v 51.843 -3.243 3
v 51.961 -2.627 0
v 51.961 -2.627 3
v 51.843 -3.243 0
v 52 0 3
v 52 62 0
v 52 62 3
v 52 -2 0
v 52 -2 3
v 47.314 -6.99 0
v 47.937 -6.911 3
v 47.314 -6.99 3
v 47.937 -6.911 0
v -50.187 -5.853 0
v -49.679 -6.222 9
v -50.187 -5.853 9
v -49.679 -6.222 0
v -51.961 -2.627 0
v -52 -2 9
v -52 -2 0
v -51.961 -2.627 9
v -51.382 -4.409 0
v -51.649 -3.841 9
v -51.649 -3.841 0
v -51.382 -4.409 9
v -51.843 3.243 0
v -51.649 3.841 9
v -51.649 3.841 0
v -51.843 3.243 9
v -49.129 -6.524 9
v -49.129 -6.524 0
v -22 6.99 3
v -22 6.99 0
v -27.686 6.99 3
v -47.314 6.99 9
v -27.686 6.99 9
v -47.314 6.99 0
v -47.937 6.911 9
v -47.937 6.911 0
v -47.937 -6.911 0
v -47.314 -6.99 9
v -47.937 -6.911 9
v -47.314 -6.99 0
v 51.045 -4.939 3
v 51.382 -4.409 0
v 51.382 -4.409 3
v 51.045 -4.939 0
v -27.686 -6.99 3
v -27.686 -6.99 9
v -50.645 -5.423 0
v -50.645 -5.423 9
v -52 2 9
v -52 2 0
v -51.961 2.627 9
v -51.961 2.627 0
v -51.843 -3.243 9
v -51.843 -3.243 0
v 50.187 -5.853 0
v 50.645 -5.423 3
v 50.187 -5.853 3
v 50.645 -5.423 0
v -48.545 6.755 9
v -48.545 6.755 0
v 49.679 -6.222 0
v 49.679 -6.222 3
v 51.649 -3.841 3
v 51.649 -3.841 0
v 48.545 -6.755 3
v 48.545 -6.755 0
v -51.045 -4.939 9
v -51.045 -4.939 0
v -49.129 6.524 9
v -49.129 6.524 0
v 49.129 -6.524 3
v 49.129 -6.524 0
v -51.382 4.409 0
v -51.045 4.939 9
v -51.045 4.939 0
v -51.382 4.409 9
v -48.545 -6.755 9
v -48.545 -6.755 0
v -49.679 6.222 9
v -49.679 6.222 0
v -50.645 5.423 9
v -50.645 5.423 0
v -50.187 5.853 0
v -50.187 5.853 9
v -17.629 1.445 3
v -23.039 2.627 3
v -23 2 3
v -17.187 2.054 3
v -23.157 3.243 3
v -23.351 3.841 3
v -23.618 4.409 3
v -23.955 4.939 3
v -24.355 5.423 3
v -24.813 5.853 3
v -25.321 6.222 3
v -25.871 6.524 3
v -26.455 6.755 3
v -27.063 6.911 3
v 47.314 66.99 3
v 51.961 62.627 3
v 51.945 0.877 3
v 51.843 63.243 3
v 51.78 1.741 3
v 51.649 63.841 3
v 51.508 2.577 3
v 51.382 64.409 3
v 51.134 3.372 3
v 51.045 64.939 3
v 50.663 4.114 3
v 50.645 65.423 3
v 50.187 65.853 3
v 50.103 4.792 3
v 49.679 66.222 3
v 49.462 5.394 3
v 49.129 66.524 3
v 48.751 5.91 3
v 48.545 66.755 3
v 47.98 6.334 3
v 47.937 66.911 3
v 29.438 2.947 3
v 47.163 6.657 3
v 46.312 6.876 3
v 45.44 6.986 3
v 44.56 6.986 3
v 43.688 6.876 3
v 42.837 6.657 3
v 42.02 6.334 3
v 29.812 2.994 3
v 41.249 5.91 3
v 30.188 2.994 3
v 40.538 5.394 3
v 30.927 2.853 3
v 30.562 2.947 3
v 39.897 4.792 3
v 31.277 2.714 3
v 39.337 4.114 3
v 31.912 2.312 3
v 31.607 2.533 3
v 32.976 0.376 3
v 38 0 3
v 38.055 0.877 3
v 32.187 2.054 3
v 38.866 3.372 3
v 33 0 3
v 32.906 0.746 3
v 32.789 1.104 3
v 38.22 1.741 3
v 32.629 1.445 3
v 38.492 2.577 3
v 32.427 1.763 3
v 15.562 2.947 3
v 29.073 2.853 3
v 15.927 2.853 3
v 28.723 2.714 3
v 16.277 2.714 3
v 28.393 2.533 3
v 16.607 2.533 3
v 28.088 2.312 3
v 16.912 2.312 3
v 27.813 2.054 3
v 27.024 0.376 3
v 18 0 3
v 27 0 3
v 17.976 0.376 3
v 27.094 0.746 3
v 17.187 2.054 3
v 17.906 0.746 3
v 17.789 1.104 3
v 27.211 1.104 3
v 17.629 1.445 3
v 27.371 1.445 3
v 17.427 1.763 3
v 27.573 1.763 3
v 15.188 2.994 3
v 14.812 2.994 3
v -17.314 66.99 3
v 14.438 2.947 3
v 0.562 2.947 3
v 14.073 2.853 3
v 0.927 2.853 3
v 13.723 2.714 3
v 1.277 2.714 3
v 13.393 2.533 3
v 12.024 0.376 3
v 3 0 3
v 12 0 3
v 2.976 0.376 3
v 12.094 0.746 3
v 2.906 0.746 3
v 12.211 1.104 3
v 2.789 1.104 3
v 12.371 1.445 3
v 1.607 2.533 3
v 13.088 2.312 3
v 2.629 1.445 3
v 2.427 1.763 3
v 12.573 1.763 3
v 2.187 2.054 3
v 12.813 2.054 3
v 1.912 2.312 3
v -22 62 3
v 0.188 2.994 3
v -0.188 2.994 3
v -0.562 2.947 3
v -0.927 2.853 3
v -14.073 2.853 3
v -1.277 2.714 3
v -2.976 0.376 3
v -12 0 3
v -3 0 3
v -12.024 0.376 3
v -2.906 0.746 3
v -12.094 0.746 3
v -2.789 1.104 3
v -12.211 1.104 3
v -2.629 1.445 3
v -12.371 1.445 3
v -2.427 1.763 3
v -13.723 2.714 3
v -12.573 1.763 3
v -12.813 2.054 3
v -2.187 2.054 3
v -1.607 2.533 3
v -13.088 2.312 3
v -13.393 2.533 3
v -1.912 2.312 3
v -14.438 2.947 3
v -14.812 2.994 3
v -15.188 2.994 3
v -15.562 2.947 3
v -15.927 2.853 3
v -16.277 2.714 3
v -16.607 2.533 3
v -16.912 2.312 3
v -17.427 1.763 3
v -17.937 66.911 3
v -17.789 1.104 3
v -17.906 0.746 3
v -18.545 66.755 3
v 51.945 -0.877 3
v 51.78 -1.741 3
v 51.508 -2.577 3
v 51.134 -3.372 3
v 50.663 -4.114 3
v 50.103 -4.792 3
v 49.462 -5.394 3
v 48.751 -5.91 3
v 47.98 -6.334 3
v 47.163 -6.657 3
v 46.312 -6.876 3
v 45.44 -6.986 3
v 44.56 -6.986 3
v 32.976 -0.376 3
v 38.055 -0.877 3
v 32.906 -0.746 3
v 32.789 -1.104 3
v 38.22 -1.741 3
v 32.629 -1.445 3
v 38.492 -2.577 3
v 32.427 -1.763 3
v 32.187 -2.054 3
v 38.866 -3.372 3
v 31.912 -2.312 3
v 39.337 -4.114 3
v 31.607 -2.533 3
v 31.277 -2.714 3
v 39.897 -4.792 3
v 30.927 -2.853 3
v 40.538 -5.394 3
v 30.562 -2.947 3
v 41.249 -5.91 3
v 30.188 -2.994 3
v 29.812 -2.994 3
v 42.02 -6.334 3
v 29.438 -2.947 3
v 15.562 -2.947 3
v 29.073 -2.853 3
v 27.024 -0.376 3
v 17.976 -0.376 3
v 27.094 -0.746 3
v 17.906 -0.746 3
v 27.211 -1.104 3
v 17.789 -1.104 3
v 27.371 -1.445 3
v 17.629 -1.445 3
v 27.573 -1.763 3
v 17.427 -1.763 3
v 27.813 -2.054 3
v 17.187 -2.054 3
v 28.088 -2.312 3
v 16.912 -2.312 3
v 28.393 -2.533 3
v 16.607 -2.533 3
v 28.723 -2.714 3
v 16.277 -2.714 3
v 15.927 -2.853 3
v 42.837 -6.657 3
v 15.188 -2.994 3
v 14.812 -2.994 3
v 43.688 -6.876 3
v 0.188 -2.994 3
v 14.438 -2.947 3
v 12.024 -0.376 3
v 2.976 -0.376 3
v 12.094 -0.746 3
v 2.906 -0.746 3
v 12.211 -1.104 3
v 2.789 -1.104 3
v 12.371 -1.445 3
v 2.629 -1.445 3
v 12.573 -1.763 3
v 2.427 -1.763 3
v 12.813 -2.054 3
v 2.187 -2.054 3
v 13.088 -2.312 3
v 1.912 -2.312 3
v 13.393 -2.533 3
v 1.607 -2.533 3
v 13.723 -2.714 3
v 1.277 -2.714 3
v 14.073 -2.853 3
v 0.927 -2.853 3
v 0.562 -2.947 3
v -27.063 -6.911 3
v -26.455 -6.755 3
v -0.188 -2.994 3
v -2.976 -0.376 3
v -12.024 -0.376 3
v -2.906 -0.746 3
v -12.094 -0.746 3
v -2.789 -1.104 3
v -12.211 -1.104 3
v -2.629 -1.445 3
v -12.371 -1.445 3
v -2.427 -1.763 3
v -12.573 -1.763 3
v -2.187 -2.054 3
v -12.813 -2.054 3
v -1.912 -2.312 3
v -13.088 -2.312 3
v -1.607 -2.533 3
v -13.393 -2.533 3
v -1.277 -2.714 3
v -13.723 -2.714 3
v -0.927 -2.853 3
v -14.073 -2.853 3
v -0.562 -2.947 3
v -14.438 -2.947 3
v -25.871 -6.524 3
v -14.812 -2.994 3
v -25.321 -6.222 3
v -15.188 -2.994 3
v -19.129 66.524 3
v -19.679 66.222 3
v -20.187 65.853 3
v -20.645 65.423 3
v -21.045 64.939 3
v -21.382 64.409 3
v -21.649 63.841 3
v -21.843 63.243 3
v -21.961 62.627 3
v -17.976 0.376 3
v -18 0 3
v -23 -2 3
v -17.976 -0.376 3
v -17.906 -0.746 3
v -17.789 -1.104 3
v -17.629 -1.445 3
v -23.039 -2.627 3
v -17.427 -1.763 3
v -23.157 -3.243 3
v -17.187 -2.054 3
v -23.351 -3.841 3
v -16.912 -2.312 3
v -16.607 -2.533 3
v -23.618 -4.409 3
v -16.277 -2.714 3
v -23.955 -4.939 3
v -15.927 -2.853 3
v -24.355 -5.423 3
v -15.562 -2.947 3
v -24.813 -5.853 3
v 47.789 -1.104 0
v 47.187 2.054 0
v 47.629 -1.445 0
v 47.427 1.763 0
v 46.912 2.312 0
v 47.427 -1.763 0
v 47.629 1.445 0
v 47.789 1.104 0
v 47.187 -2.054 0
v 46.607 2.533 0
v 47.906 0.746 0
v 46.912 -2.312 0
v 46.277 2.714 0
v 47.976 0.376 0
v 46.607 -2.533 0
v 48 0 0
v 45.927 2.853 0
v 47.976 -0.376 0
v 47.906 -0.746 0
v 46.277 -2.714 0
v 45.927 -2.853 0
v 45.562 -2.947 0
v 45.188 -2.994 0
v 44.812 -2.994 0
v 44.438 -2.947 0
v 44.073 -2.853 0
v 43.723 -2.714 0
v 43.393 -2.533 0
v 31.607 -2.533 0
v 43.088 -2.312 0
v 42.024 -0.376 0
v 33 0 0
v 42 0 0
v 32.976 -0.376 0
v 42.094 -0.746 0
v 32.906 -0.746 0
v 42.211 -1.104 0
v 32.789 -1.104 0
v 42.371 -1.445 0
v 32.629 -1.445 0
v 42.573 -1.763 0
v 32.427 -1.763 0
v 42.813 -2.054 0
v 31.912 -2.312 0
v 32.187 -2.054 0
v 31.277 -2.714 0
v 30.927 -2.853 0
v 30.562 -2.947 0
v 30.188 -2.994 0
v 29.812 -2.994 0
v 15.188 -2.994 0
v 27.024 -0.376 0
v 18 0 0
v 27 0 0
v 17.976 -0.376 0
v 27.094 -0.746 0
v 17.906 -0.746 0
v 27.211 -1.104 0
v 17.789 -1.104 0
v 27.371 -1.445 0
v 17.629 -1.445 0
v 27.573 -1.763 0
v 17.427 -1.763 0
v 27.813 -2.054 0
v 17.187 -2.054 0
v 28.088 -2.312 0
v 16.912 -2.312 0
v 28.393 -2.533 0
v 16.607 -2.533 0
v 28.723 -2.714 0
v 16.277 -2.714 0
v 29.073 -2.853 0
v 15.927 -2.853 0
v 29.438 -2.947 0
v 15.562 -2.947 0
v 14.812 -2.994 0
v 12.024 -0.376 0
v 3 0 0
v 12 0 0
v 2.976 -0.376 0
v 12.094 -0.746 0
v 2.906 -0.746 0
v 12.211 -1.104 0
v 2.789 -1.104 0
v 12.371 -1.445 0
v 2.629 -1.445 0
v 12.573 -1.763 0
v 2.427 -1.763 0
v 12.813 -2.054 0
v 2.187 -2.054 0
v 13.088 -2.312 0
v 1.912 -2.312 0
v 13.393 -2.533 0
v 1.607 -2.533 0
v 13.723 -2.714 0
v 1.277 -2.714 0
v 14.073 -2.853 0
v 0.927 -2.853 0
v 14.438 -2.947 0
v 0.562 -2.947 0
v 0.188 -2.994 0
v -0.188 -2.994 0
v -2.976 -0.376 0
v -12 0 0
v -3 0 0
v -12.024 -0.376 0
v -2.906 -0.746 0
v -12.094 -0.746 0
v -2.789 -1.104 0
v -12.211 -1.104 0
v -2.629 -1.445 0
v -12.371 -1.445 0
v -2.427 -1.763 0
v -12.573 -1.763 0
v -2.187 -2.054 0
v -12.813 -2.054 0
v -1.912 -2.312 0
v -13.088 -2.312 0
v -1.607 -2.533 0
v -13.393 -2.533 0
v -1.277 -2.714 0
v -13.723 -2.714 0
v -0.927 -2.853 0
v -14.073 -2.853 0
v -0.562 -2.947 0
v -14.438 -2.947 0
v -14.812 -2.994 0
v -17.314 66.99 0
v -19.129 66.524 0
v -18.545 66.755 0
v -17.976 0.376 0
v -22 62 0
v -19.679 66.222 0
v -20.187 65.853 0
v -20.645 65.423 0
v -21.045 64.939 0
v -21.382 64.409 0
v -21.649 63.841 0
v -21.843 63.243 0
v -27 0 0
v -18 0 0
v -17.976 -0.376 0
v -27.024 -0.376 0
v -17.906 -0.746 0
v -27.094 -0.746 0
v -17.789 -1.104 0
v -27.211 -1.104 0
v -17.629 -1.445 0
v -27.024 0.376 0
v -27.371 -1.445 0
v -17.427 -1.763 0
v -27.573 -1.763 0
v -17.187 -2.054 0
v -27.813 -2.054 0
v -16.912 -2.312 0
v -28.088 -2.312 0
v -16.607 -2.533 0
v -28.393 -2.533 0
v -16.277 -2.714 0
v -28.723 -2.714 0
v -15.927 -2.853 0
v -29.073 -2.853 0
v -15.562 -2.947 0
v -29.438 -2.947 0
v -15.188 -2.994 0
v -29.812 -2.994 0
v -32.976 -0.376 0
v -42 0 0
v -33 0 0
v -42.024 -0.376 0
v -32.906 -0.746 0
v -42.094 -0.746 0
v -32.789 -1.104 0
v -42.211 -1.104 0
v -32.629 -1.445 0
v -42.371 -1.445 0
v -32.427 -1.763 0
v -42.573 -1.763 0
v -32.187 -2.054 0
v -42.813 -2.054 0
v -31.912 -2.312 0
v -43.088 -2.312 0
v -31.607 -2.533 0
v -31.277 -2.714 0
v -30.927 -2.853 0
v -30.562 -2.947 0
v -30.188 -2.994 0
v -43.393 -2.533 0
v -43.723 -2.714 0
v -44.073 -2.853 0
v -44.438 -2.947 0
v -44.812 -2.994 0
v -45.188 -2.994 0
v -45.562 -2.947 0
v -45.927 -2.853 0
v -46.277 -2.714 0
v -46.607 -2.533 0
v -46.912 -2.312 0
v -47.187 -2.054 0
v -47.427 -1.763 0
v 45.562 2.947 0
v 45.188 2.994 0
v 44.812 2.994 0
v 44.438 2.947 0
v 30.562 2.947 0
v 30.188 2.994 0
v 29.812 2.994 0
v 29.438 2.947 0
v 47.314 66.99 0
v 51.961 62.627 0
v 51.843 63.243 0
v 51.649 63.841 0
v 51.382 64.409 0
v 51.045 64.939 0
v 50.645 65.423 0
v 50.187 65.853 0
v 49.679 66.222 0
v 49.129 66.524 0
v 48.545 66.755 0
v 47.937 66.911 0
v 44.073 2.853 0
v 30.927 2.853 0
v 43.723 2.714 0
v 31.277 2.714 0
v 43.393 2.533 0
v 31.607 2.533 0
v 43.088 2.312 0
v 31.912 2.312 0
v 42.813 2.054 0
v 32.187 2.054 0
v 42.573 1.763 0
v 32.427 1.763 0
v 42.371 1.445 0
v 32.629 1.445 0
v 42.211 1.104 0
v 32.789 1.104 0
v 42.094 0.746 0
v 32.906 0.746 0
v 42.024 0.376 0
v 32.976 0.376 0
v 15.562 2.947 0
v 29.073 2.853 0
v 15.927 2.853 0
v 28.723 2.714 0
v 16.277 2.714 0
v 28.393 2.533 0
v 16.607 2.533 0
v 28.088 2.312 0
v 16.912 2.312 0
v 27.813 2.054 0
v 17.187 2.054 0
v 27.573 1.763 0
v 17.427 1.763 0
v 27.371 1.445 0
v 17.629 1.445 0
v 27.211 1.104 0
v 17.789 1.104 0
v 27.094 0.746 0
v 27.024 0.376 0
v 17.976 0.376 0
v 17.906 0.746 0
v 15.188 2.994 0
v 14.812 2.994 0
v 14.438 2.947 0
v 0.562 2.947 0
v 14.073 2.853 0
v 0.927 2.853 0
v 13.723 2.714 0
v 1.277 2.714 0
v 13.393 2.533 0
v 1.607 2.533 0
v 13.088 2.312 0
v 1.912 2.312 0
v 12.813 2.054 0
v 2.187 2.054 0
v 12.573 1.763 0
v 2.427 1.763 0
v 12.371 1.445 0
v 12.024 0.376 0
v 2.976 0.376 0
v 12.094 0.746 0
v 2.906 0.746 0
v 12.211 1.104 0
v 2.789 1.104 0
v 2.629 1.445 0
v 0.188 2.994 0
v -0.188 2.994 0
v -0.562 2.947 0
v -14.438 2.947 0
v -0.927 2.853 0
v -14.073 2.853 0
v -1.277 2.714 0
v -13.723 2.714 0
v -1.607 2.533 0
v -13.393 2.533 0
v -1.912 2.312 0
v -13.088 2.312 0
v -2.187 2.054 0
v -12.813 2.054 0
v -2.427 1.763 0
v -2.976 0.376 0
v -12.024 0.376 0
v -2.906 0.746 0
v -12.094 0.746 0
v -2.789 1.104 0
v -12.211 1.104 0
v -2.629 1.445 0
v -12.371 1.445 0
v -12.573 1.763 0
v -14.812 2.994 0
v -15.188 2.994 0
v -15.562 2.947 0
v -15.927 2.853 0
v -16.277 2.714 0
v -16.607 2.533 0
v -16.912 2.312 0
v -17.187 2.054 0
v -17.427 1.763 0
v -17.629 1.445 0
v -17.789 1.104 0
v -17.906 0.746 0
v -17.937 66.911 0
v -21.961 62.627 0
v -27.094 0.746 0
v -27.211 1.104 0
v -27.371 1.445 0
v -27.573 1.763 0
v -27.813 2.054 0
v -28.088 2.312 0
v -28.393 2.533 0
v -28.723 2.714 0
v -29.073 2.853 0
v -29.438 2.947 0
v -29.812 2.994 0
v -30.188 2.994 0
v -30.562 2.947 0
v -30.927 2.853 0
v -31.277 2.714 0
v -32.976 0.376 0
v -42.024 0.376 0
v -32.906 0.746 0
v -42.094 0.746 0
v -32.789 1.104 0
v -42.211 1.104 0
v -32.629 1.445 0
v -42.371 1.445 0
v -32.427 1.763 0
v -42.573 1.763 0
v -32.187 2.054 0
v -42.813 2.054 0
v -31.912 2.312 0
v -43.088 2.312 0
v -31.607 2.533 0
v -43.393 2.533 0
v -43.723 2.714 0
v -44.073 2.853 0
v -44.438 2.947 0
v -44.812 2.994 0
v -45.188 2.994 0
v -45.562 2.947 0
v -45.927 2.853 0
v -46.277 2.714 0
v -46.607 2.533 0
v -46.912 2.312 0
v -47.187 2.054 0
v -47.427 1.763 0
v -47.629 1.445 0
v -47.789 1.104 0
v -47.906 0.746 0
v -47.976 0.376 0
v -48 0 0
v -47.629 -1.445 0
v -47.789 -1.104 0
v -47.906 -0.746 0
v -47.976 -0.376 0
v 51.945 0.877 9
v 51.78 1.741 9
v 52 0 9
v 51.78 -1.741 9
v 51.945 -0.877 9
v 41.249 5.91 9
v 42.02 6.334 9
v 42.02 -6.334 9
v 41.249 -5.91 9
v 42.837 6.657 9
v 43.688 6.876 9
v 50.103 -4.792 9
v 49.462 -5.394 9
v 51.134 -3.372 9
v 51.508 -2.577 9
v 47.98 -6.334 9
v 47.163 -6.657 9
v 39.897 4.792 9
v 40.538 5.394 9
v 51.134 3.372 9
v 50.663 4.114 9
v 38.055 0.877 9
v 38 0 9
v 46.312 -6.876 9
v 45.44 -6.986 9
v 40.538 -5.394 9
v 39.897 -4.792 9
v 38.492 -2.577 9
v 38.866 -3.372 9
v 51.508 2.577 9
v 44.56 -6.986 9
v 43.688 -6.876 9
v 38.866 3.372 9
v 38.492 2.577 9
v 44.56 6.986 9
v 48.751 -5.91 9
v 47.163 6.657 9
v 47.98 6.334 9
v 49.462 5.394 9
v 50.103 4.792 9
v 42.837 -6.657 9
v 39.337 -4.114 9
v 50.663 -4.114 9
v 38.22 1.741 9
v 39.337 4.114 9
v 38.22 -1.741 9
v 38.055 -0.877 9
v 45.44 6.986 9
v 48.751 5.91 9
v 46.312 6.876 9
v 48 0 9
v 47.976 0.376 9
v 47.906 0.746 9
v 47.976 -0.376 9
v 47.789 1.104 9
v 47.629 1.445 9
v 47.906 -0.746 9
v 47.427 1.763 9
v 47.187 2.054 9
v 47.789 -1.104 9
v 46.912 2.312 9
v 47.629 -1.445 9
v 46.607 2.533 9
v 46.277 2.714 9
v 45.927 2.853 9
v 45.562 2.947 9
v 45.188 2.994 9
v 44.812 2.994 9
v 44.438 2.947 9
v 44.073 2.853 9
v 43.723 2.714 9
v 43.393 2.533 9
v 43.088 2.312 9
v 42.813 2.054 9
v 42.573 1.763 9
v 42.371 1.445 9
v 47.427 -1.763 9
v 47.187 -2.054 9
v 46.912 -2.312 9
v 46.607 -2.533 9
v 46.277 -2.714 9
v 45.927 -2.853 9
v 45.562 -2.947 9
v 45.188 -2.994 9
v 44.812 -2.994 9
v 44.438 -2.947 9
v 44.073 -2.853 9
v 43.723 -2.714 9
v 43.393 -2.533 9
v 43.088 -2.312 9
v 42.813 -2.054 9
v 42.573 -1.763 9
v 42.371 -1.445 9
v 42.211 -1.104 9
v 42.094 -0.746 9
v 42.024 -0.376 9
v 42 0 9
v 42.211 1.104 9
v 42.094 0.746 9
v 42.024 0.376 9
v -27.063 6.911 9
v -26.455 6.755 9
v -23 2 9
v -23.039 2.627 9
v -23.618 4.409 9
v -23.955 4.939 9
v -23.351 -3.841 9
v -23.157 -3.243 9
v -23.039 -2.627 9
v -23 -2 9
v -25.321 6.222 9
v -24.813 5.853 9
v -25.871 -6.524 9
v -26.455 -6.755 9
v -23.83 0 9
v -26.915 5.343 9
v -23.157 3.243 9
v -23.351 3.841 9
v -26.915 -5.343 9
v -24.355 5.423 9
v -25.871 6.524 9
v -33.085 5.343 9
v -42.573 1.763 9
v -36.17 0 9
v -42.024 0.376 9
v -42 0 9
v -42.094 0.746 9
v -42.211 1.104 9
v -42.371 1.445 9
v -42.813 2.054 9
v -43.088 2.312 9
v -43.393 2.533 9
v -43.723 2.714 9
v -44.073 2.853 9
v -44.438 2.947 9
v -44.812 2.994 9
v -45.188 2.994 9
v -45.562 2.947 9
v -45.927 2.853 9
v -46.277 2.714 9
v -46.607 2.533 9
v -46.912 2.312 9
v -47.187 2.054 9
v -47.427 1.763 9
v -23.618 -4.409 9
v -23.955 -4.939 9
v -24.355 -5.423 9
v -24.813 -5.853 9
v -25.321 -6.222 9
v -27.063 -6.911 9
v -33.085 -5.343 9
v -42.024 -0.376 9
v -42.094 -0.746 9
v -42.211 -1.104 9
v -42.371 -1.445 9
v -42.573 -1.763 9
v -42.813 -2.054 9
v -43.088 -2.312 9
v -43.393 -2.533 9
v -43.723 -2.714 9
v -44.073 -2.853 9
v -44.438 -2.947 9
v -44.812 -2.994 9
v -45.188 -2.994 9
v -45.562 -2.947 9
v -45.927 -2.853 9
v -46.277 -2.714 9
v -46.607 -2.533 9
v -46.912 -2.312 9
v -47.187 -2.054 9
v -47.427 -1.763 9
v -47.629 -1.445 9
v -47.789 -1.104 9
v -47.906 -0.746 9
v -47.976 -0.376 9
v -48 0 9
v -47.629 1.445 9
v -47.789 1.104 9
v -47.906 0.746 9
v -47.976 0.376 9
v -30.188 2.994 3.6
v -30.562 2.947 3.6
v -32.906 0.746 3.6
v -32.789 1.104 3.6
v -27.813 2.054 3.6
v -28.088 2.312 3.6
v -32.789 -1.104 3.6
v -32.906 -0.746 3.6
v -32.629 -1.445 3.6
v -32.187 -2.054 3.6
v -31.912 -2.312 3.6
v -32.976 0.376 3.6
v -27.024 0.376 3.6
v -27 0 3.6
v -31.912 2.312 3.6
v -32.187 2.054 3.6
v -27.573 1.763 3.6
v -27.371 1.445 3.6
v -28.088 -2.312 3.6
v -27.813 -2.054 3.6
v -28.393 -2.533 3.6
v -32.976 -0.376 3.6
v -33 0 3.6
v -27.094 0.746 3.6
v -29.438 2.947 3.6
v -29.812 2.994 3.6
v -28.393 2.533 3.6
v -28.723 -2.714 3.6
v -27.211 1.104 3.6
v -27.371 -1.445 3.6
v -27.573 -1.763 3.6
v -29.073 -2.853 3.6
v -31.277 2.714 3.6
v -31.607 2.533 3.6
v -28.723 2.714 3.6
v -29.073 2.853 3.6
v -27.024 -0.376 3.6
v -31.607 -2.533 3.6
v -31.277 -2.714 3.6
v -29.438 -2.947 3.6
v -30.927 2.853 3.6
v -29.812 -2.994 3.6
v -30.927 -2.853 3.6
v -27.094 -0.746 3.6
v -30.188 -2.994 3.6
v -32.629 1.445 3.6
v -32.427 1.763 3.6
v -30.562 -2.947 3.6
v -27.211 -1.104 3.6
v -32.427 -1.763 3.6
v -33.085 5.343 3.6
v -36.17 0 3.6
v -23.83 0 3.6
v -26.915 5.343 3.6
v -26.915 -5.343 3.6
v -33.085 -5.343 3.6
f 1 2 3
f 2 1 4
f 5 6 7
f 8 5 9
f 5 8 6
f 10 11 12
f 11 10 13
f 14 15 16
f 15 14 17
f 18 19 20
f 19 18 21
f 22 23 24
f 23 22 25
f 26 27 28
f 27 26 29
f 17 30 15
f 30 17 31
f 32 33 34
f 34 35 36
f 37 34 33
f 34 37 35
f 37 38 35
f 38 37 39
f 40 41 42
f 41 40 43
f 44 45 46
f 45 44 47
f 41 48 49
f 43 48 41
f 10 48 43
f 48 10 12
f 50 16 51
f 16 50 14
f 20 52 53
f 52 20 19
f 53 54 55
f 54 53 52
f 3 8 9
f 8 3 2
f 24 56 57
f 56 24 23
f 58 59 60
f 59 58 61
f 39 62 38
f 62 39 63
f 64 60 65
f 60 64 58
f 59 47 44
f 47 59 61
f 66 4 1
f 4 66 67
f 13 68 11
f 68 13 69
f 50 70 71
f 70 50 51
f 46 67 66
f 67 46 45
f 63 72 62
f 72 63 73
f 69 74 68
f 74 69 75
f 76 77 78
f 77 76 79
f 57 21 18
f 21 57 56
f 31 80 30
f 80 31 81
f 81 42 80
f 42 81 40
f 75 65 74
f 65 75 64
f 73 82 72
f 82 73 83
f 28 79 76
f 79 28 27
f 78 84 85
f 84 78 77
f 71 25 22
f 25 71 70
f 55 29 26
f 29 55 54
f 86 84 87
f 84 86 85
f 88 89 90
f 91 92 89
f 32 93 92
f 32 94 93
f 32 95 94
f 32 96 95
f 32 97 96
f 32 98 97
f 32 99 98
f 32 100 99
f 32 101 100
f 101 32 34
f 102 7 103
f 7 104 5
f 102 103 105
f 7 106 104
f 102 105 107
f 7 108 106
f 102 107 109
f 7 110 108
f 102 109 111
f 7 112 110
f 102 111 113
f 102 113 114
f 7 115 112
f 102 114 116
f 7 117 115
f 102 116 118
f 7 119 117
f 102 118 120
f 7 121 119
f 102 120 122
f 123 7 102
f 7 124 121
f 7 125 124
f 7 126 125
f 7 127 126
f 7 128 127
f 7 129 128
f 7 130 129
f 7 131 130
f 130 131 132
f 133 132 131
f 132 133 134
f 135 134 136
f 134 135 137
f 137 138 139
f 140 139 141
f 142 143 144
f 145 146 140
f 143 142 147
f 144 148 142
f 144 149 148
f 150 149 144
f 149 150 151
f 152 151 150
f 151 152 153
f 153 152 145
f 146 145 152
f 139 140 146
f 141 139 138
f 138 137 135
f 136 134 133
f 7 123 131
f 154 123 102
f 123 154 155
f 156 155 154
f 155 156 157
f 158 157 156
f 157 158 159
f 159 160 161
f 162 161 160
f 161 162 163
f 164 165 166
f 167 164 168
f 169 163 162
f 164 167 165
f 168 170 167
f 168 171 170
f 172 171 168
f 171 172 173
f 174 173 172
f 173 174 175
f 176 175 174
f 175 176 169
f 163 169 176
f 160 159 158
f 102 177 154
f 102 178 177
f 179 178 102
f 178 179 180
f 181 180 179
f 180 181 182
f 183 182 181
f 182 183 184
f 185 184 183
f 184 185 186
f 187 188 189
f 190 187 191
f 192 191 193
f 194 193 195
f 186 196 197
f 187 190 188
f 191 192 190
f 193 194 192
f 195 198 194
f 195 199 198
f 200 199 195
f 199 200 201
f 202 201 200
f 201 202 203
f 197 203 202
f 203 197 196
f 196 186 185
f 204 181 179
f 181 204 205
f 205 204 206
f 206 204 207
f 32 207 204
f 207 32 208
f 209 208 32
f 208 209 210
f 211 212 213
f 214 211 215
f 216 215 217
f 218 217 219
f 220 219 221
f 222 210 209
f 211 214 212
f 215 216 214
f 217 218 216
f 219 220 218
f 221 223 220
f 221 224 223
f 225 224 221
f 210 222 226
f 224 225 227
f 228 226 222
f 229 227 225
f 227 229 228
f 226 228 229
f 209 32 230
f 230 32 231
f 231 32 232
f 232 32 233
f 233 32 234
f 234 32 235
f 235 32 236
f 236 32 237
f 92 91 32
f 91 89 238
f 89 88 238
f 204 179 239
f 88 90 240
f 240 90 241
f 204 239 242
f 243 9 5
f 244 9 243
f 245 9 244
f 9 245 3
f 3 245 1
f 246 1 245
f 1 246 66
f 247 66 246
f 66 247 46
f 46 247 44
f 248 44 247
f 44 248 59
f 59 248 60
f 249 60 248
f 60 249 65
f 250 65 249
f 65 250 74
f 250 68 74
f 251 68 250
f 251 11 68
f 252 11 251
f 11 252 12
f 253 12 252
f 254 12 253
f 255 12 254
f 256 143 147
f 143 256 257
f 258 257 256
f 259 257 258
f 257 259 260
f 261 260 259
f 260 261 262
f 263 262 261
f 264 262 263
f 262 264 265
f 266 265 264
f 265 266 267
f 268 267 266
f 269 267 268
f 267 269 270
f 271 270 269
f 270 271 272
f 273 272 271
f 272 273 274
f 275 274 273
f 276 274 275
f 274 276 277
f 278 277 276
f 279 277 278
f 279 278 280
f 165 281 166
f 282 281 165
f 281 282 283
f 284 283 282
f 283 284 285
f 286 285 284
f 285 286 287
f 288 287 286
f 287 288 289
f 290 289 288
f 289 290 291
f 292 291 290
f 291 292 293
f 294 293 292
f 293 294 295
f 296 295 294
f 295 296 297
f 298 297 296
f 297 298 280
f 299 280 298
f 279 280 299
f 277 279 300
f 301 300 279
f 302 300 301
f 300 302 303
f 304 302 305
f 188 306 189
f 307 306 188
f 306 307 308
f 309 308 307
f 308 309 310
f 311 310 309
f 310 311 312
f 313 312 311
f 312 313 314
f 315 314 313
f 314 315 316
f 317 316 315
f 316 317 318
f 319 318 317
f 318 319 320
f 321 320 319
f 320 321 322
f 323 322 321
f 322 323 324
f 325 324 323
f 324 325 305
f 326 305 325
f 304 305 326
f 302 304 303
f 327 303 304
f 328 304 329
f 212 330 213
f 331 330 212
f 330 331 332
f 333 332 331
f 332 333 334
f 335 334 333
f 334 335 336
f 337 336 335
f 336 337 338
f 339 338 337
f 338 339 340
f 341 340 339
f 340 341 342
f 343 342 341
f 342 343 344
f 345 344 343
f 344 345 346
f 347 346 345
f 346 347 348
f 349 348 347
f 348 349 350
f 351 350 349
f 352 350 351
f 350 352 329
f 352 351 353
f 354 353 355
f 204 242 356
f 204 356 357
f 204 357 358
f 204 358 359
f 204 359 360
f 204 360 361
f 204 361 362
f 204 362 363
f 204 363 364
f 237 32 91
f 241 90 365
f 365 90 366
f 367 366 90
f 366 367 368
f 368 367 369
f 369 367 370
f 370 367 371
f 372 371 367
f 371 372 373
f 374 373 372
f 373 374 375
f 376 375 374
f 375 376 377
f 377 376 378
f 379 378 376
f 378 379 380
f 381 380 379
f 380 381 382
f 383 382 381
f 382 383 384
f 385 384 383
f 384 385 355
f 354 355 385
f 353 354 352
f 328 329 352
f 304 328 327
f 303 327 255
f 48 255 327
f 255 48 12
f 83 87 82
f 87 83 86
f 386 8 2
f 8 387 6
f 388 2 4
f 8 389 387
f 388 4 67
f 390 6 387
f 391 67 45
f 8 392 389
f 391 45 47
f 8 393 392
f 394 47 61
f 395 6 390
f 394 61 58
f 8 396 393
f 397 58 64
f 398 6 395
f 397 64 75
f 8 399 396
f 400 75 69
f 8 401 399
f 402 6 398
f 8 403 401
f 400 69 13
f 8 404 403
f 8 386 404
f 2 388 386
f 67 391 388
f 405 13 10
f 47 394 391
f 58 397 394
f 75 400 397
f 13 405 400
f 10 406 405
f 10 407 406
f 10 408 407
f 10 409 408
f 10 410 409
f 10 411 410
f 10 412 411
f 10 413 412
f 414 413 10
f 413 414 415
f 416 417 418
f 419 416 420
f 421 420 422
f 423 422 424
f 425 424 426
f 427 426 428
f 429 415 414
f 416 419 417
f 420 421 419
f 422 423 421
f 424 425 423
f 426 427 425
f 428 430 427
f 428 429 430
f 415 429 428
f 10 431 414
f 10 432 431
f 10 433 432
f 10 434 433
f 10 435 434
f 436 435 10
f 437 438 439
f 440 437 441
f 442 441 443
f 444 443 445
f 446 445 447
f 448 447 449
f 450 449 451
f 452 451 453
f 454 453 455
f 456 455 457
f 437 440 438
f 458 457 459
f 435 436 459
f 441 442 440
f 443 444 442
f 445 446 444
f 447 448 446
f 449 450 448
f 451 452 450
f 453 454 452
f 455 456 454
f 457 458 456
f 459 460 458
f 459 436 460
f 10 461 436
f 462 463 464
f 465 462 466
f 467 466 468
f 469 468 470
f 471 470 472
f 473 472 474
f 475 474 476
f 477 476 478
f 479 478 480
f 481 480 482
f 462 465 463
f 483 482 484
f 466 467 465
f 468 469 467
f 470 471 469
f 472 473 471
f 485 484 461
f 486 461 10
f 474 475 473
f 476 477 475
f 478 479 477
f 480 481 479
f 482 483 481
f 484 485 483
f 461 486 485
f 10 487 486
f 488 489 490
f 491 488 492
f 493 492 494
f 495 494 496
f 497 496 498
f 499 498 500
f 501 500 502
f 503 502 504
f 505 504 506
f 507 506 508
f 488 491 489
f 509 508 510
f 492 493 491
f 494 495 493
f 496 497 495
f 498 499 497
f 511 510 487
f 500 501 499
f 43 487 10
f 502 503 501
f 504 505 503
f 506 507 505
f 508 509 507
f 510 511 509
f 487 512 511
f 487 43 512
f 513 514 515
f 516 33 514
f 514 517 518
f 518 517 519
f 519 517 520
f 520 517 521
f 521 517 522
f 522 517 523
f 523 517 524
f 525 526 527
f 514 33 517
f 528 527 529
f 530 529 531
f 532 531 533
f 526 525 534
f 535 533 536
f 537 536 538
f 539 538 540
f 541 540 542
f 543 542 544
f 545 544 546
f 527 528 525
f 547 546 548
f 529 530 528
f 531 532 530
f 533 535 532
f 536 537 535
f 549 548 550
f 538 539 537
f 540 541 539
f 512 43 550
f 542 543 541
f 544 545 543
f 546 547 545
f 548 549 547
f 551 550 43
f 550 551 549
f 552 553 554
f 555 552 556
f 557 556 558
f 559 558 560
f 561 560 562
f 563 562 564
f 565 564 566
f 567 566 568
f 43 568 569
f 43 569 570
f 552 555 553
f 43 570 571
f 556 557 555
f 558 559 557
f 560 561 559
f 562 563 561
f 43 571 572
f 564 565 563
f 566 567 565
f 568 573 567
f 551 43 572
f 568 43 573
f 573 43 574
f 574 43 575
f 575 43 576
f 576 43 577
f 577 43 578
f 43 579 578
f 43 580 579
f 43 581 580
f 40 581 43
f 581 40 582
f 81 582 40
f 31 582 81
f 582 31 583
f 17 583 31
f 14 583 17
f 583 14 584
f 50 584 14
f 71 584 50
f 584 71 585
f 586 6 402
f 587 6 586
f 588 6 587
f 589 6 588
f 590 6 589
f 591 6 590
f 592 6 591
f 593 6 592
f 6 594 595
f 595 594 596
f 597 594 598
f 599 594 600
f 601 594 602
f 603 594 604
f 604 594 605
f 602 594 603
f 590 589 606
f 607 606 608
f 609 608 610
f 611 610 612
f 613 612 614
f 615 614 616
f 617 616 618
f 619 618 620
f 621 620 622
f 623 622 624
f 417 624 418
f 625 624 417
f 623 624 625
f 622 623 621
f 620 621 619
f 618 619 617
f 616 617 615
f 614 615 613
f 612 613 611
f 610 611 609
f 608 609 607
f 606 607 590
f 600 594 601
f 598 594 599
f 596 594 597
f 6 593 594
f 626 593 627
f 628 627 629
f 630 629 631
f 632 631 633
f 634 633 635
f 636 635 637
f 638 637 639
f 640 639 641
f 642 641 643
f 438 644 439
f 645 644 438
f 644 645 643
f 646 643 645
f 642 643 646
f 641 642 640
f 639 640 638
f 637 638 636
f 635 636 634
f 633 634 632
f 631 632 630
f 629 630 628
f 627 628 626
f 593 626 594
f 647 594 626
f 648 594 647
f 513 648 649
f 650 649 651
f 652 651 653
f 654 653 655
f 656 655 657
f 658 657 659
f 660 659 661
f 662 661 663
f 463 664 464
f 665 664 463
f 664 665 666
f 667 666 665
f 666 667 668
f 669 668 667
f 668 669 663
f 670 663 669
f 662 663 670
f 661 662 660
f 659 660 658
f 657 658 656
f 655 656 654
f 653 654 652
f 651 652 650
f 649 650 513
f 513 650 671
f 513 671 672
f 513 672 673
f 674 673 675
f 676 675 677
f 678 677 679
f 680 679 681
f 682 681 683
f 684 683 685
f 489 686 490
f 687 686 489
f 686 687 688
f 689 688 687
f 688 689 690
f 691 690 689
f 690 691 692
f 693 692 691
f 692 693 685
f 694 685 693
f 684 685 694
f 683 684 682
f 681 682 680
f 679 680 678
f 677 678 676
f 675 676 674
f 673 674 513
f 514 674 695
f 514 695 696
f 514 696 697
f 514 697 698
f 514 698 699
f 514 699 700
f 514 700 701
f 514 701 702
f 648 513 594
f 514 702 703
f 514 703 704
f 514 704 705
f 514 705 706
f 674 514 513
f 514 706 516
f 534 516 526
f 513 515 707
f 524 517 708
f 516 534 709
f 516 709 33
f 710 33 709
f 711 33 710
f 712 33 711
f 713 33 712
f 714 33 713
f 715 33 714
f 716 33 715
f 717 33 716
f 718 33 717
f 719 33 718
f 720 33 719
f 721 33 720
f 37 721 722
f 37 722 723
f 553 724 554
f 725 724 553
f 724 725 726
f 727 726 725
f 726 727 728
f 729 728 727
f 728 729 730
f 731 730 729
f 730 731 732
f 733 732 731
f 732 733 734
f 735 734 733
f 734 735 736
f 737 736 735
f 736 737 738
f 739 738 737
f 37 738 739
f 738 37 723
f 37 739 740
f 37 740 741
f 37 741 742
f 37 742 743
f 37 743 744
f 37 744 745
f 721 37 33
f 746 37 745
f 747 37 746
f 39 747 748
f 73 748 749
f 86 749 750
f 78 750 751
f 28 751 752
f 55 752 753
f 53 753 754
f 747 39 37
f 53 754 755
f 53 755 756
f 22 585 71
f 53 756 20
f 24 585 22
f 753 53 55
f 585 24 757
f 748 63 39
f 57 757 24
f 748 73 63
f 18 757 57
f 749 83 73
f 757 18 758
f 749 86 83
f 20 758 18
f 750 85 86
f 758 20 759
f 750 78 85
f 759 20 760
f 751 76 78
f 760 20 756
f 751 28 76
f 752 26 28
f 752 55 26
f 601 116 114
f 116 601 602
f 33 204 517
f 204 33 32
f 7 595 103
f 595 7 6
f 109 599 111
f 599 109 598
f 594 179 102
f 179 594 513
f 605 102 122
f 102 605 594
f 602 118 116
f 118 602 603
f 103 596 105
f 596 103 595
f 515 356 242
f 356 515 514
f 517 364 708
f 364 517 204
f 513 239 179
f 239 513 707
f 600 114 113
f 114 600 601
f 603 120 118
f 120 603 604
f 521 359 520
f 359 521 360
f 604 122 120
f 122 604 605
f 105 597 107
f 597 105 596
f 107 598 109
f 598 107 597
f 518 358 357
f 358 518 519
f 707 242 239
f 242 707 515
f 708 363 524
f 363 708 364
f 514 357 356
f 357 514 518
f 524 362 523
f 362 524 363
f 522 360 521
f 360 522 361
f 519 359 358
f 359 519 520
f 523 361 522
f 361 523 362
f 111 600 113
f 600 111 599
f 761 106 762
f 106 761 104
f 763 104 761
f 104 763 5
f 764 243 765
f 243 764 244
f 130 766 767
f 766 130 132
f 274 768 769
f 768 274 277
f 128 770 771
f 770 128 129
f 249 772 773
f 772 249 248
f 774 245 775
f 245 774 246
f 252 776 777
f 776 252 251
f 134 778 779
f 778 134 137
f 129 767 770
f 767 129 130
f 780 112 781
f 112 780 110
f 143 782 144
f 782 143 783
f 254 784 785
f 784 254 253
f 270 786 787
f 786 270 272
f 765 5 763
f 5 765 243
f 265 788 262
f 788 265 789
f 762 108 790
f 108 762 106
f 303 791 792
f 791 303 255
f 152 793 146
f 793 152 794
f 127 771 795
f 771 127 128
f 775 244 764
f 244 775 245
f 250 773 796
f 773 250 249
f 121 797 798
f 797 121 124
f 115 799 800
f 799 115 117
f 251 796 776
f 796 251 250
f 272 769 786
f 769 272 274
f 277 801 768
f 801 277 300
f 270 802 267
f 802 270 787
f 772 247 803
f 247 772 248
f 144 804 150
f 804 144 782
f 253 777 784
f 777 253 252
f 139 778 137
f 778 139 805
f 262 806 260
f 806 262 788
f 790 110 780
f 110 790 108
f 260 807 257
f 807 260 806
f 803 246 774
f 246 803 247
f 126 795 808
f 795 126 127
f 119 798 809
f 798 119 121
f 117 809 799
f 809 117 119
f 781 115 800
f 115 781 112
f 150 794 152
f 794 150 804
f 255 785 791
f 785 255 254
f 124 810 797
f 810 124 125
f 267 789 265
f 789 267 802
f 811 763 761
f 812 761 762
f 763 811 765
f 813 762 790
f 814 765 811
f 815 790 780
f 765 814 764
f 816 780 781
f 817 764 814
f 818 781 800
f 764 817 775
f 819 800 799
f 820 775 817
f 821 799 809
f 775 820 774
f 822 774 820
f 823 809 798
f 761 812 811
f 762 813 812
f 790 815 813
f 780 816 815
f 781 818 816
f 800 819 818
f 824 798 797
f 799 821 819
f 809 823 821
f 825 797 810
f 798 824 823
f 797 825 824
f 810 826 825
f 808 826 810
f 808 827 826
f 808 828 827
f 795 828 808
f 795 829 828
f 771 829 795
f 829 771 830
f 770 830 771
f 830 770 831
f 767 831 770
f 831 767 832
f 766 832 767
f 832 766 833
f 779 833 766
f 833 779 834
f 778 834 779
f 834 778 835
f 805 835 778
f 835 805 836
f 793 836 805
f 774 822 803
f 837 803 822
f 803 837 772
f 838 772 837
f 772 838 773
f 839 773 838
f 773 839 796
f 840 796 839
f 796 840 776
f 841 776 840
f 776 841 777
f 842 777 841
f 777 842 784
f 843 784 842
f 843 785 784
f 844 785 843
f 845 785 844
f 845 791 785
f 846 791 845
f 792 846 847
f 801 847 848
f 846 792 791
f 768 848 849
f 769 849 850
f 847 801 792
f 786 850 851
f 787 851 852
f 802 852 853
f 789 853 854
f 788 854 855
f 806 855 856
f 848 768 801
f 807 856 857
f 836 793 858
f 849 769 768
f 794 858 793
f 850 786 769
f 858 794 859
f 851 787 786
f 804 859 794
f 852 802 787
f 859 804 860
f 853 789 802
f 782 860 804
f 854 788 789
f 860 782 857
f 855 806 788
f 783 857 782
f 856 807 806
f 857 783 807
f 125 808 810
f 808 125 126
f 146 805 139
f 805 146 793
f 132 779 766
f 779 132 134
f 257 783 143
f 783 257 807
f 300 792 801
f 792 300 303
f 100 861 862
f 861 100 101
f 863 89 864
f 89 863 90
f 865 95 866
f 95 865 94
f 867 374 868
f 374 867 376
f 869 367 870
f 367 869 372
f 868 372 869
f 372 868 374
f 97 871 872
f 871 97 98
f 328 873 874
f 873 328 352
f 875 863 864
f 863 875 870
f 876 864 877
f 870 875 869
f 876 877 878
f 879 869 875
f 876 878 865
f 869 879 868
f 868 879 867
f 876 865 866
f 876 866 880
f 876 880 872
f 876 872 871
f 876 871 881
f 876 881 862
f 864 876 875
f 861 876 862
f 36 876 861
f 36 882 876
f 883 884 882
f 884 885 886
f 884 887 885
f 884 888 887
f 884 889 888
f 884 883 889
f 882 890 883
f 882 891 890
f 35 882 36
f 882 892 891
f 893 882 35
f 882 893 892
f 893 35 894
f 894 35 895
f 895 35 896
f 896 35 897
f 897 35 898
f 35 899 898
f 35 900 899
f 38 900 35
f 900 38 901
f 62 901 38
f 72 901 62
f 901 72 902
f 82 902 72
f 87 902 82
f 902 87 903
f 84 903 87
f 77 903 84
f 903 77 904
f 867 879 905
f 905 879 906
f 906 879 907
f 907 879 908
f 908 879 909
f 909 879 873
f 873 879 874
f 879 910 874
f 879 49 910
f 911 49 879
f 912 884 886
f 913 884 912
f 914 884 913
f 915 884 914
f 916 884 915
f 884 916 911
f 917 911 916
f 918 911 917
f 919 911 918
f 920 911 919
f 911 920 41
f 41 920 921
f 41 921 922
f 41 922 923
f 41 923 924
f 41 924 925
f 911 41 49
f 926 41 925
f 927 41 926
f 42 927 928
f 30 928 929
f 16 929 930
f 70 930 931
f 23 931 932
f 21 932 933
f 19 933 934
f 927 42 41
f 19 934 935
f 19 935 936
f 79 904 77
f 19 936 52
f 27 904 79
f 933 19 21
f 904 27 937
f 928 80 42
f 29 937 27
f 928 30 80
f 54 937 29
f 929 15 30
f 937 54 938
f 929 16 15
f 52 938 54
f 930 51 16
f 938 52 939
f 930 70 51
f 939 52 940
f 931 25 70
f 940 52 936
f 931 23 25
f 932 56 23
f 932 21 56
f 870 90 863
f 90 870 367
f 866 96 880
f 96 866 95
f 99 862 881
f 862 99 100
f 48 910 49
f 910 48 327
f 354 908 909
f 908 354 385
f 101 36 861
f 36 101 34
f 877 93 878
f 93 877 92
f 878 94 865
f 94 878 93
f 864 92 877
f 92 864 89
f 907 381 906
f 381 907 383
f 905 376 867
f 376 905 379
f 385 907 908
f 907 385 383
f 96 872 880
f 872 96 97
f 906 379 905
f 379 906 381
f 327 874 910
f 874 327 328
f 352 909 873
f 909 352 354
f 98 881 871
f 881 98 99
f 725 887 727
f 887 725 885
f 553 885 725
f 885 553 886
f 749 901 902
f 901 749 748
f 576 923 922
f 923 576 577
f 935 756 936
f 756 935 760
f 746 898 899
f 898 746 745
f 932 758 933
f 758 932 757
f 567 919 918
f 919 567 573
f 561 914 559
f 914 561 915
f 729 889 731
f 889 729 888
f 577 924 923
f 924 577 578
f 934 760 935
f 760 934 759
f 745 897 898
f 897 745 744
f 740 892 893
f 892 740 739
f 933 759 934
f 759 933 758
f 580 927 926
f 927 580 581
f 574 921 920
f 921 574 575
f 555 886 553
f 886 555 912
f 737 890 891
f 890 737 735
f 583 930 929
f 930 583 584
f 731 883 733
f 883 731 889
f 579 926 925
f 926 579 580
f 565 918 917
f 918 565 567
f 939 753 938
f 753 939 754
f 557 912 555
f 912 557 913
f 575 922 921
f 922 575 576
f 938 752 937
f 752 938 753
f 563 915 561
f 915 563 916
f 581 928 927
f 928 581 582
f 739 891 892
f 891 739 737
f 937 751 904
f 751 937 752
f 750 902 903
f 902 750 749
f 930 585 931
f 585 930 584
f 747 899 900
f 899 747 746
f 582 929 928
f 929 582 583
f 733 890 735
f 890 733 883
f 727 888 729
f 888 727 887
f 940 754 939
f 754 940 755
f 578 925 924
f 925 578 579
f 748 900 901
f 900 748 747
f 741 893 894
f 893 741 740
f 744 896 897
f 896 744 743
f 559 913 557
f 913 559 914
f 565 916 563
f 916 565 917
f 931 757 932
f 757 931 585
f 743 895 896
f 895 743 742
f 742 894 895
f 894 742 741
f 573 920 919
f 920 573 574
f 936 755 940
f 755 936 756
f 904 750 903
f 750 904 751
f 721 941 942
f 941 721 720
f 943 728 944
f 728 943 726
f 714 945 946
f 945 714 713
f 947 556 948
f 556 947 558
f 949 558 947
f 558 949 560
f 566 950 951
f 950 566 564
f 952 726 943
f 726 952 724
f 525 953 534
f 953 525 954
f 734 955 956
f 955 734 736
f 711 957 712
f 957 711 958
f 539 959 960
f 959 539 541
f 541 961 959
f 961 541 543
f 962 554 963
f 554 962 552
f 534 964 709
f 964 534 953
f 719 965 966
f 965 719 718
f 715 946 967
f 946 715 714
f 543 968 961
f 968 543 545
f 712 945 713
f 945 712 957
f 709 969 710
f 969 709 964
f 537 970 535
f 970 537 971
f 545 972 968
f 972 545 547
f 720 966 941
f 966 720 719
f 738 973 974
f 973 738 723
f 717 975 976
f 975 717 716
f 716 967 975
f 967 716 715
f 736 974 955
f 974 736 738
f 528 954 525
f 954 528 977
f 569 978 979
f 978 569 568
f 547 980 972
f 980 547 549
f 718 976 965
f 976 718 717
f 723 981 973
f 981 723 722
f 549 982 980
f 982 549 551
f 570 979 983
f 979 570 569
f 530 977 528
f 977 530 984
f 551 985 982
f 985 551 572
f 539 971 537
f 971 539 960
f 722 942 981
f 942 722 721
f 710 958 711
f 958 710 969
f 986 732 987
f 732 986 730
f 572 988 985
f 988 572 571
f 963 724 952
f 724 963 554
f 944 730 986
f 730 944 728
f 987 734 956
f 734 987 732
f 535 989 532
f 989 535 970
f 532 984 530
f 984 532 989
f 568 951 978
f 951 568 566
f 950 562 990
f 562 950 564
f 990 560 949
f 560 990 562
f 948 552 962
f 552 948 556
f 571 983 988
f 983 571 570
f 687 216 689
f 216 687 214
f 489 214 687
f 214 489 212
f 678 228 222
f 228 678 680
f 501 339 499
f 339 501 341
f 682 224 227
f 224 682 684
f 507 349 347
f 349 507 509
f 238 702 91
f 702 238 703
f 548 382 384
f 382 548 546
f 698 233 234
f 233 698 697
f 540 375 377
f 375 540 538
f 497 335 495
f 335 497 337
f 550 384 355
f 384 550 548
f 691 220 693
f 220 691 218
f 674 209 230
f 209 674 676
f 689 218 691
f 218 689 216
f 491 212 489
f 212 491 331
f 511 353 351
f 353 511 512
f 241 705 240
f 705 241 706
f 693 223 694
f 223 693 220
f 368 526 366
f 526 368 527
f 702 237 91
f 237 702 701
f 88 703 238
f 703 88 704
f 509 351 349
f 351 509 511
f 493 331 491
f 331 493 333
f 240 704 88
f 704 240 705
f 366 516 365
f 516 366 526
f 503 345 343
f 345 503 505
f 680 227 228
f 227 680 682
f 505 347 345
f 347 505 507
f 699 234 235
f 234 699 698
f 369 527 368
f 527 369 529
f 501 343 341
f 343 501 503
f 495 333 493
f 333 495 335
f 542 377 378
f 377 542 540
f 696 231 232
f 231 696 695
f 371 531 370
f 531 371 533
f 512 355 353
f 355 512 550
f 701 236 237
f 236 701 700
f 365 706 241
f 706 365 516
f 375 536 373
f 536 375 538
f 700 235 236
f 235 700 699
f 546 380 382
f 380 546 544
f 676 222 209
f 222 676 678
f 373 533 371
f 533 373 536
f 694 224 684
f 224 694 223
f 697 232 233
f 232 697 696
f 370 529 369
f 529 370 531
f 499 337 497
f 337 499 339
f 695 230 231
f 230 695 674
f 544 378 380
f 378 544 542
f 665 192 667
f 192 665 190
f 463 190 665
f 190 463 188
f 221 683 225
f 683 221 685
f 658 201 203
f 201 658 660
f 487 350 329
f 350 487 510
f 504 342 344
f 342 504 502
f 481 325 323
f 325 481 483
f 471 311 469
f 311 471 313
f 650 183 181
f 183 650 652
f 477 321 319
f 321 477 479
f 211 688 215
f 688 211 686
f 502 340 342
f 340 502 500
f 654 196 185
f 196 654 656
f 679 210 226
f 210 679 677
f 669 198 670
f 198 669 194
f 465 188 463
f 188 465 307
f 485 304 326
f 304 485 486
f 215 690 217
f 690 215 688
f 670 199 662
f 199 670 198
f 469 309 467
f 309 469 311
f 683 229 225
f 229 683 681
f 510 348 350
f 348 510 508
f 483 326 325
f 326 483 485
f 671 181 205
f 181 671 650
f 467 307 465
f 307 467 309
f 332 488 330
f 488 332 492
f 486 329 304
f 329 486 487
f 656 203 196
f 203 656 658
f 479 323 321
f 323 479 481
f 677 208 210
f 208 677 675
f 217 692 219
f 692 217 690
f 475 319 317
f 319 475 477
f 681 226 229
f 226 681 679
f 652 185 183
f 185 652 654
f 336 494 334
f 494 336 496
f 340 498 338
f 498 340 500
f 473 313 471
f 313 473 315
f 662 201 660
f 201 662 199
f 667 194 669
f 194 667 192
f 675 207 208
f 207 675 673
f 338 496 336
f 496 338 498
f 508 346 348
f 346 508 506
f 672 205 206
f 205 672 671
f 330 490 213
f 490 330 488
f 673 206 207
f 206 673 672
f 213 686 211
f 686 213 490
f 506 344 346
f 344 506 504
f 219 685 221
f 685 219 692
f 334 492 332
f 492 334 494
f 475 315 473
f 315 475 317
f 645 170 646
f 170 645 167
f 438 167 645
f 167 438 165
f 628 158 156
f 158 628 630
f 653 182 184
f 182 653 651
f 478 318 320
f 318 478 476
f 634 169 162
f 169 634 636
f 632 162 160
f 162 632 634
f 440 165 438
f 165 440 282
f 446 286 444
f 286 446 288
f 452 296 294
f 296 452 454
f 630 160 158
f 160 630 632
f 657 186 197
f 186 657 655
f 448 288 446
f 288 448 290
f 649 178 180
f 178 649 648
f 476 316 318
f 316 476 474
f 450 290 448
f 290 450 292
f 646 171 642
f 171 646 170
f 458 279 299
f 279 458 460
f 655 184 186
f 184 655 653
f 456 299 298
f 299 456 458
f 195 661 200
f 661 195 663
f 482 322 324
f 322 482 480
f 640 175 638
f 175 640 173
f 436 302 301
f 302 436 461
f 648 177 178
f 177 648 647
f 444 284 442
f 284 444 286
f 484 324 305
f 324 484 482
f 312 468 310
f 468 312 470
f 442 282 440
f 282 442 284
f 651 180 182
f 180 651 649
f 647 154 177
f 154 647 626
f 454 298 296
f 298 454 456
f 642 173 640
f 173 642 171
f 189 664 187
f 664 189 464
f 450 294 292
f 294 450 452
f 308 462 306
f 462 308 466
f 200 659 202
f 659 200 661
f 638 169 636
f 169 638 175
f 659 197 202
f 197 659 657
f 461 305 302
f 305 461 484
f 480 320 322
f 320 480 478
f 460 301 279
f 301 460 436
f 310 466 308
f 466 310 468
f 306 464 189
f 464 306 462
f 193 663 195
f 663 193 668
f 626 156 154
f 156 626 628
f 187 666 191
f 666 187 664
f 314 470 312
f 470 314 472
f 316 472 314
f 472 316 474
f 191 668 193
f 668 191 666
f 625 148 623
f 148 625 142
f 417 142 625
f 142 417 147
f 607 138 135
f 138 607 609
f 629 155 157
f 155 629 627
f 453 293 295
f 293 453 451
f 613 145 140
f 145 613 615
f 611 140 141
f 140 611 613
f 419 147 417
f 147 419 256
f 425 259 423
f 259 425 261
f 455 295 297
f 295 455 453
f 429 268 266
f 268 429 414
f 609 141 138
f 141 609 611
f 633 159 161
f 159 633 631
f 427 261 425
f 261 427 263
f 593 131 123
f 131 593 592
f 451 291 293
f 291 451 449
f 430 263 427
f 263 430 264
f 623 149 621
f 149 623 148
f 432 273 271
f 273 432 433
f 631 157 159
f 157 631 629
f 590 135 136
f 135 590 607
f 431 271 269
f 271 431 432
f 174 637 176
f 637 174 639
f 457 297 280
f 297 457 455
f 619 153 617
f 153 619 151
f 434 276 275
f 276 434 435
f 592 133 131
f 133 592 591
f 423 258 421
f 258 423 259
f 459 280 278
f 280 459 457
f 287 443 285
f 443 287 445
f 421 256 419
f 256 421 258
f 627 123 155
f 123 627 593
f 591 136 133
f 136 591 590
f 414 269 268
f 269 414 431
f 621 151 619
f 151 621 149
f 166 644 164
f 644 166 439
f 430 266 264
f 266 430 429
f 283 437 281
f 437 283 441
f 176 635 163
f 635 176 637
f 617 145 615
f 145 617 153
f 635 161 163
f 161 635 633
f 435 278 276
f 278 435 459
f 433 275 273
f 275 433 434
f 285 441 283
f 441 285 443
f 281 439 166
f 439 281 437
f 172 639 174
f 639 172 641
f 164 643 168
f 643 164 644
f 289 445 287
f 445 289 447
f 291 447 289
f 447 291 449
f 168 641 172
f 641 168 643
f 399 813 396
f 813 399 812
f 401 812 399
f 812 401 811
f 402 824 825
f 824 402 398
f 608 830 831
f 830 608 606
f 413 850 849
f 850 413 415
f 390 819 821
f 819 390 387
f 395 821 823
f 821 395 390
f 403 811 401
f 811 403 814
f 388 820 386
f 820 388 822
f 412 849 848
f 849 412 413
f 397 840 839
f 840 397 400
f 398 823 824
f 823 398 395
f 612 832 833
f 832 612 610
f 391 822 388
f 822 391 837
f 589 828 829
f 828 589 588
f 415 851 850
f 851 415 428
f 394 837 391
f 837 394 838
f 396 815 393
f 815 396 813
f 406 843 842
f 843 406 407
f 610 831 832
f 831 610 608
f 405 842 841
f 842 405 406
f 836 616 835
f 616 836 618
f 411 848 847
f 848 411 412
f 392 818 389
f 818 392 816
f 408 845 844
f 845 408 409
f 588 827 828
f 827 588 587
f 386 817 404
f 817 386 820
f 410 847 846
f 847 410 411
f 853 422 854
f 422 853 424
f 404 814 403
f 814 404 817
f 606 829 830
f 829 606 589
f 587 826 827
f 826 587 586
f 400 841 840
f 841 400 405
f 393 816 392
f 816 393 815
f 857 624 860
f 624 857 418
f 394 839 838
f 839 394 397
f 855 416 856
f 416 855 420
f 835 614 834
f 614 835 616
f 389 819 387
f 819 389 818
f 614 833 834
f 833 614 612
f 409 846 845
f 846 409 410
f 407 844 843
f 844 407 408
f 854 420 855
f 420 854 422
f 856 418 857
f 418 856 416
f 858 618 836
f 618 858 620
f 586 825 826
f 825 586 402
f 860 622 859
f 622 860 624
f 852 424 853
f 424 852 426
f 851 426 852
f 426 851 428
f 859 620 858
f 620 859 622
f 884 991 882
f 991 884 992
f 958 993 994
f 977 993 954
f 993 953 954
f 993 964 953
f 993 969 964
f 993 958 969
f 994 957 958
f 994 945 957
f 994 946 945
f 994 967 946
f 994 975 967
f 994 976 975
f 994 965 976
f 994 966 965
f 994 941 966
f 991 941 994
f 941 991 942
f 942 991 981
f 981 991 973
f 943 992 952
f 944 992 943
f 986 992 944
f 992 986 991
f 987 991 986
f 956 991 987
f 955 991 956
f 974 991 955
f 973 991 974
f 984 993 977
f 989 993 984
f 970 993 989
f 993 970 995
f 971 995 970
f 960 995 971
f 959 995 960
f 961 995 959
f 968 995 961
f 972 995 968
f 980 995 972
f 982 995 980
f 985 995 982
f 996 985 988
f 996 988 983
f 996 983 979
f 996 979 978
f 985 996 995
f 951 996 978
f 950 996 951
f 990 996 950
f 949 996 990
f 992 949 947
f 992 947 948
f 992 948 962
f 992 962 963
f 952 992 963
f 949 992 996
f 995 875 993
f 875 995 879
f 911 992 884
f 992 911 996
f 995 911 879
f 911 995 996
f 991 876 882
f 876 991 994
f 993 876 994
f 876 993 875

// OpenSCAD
$fn = 50;


difference() {
	union() {
		translate(v = [0, 0, 0]) {
			rotate(a = [0, 0, 0]) {
				hull() {
					translate(v = [-47.0000000000, 2.0000000000, 0]) {
						rotate(a = [0, 0, 0]) {
							translate(v = [0, 0, 0]) {
								rotate(a = [0, 0, 0]) {
									cylinder(h = 3, r = 5);
								}
							}
						}
					}
					translate(v = [47.0000000000, 2.0000000000, 0]) {
						rotate(a = [0, 0, 0]) {
							translate(v = [0, 0, 0]) {
								rotate(a = [0, 0, 0]) {
									cylinder(h = 3, r = 5);
								}
							}
						}
					}
					translate(v = [-47.0000000000, -2.0000000000, 0]) {
						rotate(a = [0, 0, 0]) {
							translate(v = [0, 0, 0]) {
								rotate(a = [0, 0, 0]) {
									cylinder(h = 3, r = 5);
								}
							}
						}
					}
					translate(v = [47.0000000000, -2.0000000000, 0]) {
						rotate(a = [0, 0, 0]) {
							translate(v = [0, 0, 0]) {
								rotate(a = [0, 0, 0]) {
									cylinder(h = 3, r = 5);
								}
							}
						}
					}
				}
			}
		}
		translate(v = [15, 30, 0]) {
			rotate(a = [0, 0, 0]) {
				hull() {
					translate(v = [-32.0000000000, 32.0000000000, 0]) {
						rotate(a = [0, 0, 0]) {
							translate(v = [0, 0, 0]) {
								rotate(a = [0, 0, 0]) {
									cylinder(h = 3, r = 5);
								}
							}
						}
					}
					translate(v = [32.0000000000, 32.0000000000, 0]) {
						rotate(a = [0, 0, 0]) {
							translate(v = [0, 0, 0]) {
								rotate(a = [0, 0, 0]) {
									cylinder(h = 3, r = 5);
								}
							}
						}
					}
					translate(v = [-32.0000000000, -32.0000000000, 0]) {
						rotate(a = [0, 0, 0]) {
							translate(v = [0, 0, 0]) {
								rotate(a = [0, 0, 0]) {
									cylinder(h = 3, r = 5);
								}
							}
						}
					}
					translate(v = [32.0000000000, -32.0000000000, 0]) {
						rotate(a = [0, 0, 0]) {
							translate(v = [0, 0, 0]) {
								rotate(a = [0, 0, 0]) {
									cylinder(h = 3, r = 5);
								}
							}
						}
					}
				}
			}
		}
		translate(v = [45.0000000000, 0, 0]) {
			rotate(a = [0, 0, 0]) {
				cylinder(h = 9, r = 7.0000000000);
			}
		}
		translate(v = [-37.5000000000, 0, 0]) {
			rotate(a = [0, 0, 0]) {
				hull() {
					translate(v = [-9.5000000000, 2.0000000000, 0]) {
						rotate(a = [0, 0, 0]) {
							translate(v = [0, 0, 0]) {
								rotate(a = [0, 0, 0]) {
									cylinder(h = 9, r = 5);
								}
							}
						}
					}
					translate(v = [9.5000000000, 2.0000000000, 0]) {
						rotate(a = [0, 0, 0]) {
							translate(v = [0, 0, 0]) {
								rotate(a = [0, 0, 0]) {
									cylinder(h = 9, r = 5);
								}
							}
						}
					}
					translate(v = [-9.5000000000, -2.0000000000, 0]) {
						rotate(a = [0, 0, 0]) {
							translate(v = [0, 0, 0]) {
								rotate(a = [0, 0, 0]) {
									cylinder(h = 9, r = 5);
								}
							}
						}
					}
					translate(v = [9.5000000000, -2.0000000000, 0]) {
						rotate(a = [0, 0, 0]) {
							translate(v = [0, 0, 0]) {
								rotate(a = [0, 0, 0]) {
									cylinder(h = 9, r = 5);
								}
							}
						}
					}
				}
			}
		}
	}
	union() {
		translate(v = [-45.0000000000, 0.0000000000, 0]) {
			rotate(a = [0, 0, 0]) {
				translate(v = [0, 0, -50]) {
					rotate(a = [0, 0, 0]) {
						cylinder(h = 100, r = 3.0000000000);
					}
				}
			}
		}
		translate(v = [-30.0000000000, 0.0000000000, 0]) {
			rotate(a = [0, 0, 0]) {
				translate(v = [0, 0, -50]) {
					rotate(a = [0, 0, 0]) {
						cylinder(h = 100, r = 3.0000000000);
					}
				}
			}
		}
		translate(v = [-15.0000000000, 0.0000000000, 0]) {
			rotate(a = [0, 0, 0]) {
				translate(v = [0, 0, -50]) {
					rotate(a = [0, 0, 0]) {
						cylinder(h = 100, r = 3.0000000000);
					}
				}
			}
		}
		translate(v = [0.0000000000, 0.0000000000, 0]) {
			rotate(a = [0, 0, 0]) {
				translate(v = [0, 0, -50]) {
					rotate(a = [0, 0, 0]) {
						cylinder(h = 100, r = 3.0000000000);
					}
				}
			}
		}
		translate(v = [15.0000000000, 0.0000000000, 0]) {
			rotate(a = [0, 0, 0]) {
				translate(v = [0, 0, -50]) {
					rotate(a = [0, 0, 0]) {
						cylinder(h = 100, r = 3.0000000000);
					}
				}
			}
		}
		translate(v = [30.0000000000, 0.0000000000, 0]) {
			rotate(a = [0, 0, 0]) {
				translate(v = [0, 0, -50]) {
					rotate(a = [0, 0, 0]) {
						cylinder(h = 100, r = 3.0000000000);
					}
				}
			}
		}
		translate(v = [45.0000000000, 0.0000000000, 0]) {
			rotate(a = [0, 0, 0]) {
				translate(v = [0, 0, -50]) {
					rotate(a = [0, 0, 0]) {
						cylinder(h = 100, r = 3.0000000000);
					}
				}
			}
		}
		translate(v = [-30.0000000000, 0, 3.6000000000]) {
			rotate(a = [0, 0, 0]) {
				translate(v = [0, 0, 0]) {
					rotate(a = [0, 0, 0]) {
						linear_extrude(height = 5.4000000000) {
							polygon(points = [[6.1700000000, 0.0000000000], [3.0850000000, 5.3433767413], [-3.0850000000, 5.3433767413], [-6.1700000000, 0.0000000000], [-3.0850000000, -5.3433767413], [3.0850000000, -5.3433767413]]);
						}
					}
				}
			}
		}
	}
}
